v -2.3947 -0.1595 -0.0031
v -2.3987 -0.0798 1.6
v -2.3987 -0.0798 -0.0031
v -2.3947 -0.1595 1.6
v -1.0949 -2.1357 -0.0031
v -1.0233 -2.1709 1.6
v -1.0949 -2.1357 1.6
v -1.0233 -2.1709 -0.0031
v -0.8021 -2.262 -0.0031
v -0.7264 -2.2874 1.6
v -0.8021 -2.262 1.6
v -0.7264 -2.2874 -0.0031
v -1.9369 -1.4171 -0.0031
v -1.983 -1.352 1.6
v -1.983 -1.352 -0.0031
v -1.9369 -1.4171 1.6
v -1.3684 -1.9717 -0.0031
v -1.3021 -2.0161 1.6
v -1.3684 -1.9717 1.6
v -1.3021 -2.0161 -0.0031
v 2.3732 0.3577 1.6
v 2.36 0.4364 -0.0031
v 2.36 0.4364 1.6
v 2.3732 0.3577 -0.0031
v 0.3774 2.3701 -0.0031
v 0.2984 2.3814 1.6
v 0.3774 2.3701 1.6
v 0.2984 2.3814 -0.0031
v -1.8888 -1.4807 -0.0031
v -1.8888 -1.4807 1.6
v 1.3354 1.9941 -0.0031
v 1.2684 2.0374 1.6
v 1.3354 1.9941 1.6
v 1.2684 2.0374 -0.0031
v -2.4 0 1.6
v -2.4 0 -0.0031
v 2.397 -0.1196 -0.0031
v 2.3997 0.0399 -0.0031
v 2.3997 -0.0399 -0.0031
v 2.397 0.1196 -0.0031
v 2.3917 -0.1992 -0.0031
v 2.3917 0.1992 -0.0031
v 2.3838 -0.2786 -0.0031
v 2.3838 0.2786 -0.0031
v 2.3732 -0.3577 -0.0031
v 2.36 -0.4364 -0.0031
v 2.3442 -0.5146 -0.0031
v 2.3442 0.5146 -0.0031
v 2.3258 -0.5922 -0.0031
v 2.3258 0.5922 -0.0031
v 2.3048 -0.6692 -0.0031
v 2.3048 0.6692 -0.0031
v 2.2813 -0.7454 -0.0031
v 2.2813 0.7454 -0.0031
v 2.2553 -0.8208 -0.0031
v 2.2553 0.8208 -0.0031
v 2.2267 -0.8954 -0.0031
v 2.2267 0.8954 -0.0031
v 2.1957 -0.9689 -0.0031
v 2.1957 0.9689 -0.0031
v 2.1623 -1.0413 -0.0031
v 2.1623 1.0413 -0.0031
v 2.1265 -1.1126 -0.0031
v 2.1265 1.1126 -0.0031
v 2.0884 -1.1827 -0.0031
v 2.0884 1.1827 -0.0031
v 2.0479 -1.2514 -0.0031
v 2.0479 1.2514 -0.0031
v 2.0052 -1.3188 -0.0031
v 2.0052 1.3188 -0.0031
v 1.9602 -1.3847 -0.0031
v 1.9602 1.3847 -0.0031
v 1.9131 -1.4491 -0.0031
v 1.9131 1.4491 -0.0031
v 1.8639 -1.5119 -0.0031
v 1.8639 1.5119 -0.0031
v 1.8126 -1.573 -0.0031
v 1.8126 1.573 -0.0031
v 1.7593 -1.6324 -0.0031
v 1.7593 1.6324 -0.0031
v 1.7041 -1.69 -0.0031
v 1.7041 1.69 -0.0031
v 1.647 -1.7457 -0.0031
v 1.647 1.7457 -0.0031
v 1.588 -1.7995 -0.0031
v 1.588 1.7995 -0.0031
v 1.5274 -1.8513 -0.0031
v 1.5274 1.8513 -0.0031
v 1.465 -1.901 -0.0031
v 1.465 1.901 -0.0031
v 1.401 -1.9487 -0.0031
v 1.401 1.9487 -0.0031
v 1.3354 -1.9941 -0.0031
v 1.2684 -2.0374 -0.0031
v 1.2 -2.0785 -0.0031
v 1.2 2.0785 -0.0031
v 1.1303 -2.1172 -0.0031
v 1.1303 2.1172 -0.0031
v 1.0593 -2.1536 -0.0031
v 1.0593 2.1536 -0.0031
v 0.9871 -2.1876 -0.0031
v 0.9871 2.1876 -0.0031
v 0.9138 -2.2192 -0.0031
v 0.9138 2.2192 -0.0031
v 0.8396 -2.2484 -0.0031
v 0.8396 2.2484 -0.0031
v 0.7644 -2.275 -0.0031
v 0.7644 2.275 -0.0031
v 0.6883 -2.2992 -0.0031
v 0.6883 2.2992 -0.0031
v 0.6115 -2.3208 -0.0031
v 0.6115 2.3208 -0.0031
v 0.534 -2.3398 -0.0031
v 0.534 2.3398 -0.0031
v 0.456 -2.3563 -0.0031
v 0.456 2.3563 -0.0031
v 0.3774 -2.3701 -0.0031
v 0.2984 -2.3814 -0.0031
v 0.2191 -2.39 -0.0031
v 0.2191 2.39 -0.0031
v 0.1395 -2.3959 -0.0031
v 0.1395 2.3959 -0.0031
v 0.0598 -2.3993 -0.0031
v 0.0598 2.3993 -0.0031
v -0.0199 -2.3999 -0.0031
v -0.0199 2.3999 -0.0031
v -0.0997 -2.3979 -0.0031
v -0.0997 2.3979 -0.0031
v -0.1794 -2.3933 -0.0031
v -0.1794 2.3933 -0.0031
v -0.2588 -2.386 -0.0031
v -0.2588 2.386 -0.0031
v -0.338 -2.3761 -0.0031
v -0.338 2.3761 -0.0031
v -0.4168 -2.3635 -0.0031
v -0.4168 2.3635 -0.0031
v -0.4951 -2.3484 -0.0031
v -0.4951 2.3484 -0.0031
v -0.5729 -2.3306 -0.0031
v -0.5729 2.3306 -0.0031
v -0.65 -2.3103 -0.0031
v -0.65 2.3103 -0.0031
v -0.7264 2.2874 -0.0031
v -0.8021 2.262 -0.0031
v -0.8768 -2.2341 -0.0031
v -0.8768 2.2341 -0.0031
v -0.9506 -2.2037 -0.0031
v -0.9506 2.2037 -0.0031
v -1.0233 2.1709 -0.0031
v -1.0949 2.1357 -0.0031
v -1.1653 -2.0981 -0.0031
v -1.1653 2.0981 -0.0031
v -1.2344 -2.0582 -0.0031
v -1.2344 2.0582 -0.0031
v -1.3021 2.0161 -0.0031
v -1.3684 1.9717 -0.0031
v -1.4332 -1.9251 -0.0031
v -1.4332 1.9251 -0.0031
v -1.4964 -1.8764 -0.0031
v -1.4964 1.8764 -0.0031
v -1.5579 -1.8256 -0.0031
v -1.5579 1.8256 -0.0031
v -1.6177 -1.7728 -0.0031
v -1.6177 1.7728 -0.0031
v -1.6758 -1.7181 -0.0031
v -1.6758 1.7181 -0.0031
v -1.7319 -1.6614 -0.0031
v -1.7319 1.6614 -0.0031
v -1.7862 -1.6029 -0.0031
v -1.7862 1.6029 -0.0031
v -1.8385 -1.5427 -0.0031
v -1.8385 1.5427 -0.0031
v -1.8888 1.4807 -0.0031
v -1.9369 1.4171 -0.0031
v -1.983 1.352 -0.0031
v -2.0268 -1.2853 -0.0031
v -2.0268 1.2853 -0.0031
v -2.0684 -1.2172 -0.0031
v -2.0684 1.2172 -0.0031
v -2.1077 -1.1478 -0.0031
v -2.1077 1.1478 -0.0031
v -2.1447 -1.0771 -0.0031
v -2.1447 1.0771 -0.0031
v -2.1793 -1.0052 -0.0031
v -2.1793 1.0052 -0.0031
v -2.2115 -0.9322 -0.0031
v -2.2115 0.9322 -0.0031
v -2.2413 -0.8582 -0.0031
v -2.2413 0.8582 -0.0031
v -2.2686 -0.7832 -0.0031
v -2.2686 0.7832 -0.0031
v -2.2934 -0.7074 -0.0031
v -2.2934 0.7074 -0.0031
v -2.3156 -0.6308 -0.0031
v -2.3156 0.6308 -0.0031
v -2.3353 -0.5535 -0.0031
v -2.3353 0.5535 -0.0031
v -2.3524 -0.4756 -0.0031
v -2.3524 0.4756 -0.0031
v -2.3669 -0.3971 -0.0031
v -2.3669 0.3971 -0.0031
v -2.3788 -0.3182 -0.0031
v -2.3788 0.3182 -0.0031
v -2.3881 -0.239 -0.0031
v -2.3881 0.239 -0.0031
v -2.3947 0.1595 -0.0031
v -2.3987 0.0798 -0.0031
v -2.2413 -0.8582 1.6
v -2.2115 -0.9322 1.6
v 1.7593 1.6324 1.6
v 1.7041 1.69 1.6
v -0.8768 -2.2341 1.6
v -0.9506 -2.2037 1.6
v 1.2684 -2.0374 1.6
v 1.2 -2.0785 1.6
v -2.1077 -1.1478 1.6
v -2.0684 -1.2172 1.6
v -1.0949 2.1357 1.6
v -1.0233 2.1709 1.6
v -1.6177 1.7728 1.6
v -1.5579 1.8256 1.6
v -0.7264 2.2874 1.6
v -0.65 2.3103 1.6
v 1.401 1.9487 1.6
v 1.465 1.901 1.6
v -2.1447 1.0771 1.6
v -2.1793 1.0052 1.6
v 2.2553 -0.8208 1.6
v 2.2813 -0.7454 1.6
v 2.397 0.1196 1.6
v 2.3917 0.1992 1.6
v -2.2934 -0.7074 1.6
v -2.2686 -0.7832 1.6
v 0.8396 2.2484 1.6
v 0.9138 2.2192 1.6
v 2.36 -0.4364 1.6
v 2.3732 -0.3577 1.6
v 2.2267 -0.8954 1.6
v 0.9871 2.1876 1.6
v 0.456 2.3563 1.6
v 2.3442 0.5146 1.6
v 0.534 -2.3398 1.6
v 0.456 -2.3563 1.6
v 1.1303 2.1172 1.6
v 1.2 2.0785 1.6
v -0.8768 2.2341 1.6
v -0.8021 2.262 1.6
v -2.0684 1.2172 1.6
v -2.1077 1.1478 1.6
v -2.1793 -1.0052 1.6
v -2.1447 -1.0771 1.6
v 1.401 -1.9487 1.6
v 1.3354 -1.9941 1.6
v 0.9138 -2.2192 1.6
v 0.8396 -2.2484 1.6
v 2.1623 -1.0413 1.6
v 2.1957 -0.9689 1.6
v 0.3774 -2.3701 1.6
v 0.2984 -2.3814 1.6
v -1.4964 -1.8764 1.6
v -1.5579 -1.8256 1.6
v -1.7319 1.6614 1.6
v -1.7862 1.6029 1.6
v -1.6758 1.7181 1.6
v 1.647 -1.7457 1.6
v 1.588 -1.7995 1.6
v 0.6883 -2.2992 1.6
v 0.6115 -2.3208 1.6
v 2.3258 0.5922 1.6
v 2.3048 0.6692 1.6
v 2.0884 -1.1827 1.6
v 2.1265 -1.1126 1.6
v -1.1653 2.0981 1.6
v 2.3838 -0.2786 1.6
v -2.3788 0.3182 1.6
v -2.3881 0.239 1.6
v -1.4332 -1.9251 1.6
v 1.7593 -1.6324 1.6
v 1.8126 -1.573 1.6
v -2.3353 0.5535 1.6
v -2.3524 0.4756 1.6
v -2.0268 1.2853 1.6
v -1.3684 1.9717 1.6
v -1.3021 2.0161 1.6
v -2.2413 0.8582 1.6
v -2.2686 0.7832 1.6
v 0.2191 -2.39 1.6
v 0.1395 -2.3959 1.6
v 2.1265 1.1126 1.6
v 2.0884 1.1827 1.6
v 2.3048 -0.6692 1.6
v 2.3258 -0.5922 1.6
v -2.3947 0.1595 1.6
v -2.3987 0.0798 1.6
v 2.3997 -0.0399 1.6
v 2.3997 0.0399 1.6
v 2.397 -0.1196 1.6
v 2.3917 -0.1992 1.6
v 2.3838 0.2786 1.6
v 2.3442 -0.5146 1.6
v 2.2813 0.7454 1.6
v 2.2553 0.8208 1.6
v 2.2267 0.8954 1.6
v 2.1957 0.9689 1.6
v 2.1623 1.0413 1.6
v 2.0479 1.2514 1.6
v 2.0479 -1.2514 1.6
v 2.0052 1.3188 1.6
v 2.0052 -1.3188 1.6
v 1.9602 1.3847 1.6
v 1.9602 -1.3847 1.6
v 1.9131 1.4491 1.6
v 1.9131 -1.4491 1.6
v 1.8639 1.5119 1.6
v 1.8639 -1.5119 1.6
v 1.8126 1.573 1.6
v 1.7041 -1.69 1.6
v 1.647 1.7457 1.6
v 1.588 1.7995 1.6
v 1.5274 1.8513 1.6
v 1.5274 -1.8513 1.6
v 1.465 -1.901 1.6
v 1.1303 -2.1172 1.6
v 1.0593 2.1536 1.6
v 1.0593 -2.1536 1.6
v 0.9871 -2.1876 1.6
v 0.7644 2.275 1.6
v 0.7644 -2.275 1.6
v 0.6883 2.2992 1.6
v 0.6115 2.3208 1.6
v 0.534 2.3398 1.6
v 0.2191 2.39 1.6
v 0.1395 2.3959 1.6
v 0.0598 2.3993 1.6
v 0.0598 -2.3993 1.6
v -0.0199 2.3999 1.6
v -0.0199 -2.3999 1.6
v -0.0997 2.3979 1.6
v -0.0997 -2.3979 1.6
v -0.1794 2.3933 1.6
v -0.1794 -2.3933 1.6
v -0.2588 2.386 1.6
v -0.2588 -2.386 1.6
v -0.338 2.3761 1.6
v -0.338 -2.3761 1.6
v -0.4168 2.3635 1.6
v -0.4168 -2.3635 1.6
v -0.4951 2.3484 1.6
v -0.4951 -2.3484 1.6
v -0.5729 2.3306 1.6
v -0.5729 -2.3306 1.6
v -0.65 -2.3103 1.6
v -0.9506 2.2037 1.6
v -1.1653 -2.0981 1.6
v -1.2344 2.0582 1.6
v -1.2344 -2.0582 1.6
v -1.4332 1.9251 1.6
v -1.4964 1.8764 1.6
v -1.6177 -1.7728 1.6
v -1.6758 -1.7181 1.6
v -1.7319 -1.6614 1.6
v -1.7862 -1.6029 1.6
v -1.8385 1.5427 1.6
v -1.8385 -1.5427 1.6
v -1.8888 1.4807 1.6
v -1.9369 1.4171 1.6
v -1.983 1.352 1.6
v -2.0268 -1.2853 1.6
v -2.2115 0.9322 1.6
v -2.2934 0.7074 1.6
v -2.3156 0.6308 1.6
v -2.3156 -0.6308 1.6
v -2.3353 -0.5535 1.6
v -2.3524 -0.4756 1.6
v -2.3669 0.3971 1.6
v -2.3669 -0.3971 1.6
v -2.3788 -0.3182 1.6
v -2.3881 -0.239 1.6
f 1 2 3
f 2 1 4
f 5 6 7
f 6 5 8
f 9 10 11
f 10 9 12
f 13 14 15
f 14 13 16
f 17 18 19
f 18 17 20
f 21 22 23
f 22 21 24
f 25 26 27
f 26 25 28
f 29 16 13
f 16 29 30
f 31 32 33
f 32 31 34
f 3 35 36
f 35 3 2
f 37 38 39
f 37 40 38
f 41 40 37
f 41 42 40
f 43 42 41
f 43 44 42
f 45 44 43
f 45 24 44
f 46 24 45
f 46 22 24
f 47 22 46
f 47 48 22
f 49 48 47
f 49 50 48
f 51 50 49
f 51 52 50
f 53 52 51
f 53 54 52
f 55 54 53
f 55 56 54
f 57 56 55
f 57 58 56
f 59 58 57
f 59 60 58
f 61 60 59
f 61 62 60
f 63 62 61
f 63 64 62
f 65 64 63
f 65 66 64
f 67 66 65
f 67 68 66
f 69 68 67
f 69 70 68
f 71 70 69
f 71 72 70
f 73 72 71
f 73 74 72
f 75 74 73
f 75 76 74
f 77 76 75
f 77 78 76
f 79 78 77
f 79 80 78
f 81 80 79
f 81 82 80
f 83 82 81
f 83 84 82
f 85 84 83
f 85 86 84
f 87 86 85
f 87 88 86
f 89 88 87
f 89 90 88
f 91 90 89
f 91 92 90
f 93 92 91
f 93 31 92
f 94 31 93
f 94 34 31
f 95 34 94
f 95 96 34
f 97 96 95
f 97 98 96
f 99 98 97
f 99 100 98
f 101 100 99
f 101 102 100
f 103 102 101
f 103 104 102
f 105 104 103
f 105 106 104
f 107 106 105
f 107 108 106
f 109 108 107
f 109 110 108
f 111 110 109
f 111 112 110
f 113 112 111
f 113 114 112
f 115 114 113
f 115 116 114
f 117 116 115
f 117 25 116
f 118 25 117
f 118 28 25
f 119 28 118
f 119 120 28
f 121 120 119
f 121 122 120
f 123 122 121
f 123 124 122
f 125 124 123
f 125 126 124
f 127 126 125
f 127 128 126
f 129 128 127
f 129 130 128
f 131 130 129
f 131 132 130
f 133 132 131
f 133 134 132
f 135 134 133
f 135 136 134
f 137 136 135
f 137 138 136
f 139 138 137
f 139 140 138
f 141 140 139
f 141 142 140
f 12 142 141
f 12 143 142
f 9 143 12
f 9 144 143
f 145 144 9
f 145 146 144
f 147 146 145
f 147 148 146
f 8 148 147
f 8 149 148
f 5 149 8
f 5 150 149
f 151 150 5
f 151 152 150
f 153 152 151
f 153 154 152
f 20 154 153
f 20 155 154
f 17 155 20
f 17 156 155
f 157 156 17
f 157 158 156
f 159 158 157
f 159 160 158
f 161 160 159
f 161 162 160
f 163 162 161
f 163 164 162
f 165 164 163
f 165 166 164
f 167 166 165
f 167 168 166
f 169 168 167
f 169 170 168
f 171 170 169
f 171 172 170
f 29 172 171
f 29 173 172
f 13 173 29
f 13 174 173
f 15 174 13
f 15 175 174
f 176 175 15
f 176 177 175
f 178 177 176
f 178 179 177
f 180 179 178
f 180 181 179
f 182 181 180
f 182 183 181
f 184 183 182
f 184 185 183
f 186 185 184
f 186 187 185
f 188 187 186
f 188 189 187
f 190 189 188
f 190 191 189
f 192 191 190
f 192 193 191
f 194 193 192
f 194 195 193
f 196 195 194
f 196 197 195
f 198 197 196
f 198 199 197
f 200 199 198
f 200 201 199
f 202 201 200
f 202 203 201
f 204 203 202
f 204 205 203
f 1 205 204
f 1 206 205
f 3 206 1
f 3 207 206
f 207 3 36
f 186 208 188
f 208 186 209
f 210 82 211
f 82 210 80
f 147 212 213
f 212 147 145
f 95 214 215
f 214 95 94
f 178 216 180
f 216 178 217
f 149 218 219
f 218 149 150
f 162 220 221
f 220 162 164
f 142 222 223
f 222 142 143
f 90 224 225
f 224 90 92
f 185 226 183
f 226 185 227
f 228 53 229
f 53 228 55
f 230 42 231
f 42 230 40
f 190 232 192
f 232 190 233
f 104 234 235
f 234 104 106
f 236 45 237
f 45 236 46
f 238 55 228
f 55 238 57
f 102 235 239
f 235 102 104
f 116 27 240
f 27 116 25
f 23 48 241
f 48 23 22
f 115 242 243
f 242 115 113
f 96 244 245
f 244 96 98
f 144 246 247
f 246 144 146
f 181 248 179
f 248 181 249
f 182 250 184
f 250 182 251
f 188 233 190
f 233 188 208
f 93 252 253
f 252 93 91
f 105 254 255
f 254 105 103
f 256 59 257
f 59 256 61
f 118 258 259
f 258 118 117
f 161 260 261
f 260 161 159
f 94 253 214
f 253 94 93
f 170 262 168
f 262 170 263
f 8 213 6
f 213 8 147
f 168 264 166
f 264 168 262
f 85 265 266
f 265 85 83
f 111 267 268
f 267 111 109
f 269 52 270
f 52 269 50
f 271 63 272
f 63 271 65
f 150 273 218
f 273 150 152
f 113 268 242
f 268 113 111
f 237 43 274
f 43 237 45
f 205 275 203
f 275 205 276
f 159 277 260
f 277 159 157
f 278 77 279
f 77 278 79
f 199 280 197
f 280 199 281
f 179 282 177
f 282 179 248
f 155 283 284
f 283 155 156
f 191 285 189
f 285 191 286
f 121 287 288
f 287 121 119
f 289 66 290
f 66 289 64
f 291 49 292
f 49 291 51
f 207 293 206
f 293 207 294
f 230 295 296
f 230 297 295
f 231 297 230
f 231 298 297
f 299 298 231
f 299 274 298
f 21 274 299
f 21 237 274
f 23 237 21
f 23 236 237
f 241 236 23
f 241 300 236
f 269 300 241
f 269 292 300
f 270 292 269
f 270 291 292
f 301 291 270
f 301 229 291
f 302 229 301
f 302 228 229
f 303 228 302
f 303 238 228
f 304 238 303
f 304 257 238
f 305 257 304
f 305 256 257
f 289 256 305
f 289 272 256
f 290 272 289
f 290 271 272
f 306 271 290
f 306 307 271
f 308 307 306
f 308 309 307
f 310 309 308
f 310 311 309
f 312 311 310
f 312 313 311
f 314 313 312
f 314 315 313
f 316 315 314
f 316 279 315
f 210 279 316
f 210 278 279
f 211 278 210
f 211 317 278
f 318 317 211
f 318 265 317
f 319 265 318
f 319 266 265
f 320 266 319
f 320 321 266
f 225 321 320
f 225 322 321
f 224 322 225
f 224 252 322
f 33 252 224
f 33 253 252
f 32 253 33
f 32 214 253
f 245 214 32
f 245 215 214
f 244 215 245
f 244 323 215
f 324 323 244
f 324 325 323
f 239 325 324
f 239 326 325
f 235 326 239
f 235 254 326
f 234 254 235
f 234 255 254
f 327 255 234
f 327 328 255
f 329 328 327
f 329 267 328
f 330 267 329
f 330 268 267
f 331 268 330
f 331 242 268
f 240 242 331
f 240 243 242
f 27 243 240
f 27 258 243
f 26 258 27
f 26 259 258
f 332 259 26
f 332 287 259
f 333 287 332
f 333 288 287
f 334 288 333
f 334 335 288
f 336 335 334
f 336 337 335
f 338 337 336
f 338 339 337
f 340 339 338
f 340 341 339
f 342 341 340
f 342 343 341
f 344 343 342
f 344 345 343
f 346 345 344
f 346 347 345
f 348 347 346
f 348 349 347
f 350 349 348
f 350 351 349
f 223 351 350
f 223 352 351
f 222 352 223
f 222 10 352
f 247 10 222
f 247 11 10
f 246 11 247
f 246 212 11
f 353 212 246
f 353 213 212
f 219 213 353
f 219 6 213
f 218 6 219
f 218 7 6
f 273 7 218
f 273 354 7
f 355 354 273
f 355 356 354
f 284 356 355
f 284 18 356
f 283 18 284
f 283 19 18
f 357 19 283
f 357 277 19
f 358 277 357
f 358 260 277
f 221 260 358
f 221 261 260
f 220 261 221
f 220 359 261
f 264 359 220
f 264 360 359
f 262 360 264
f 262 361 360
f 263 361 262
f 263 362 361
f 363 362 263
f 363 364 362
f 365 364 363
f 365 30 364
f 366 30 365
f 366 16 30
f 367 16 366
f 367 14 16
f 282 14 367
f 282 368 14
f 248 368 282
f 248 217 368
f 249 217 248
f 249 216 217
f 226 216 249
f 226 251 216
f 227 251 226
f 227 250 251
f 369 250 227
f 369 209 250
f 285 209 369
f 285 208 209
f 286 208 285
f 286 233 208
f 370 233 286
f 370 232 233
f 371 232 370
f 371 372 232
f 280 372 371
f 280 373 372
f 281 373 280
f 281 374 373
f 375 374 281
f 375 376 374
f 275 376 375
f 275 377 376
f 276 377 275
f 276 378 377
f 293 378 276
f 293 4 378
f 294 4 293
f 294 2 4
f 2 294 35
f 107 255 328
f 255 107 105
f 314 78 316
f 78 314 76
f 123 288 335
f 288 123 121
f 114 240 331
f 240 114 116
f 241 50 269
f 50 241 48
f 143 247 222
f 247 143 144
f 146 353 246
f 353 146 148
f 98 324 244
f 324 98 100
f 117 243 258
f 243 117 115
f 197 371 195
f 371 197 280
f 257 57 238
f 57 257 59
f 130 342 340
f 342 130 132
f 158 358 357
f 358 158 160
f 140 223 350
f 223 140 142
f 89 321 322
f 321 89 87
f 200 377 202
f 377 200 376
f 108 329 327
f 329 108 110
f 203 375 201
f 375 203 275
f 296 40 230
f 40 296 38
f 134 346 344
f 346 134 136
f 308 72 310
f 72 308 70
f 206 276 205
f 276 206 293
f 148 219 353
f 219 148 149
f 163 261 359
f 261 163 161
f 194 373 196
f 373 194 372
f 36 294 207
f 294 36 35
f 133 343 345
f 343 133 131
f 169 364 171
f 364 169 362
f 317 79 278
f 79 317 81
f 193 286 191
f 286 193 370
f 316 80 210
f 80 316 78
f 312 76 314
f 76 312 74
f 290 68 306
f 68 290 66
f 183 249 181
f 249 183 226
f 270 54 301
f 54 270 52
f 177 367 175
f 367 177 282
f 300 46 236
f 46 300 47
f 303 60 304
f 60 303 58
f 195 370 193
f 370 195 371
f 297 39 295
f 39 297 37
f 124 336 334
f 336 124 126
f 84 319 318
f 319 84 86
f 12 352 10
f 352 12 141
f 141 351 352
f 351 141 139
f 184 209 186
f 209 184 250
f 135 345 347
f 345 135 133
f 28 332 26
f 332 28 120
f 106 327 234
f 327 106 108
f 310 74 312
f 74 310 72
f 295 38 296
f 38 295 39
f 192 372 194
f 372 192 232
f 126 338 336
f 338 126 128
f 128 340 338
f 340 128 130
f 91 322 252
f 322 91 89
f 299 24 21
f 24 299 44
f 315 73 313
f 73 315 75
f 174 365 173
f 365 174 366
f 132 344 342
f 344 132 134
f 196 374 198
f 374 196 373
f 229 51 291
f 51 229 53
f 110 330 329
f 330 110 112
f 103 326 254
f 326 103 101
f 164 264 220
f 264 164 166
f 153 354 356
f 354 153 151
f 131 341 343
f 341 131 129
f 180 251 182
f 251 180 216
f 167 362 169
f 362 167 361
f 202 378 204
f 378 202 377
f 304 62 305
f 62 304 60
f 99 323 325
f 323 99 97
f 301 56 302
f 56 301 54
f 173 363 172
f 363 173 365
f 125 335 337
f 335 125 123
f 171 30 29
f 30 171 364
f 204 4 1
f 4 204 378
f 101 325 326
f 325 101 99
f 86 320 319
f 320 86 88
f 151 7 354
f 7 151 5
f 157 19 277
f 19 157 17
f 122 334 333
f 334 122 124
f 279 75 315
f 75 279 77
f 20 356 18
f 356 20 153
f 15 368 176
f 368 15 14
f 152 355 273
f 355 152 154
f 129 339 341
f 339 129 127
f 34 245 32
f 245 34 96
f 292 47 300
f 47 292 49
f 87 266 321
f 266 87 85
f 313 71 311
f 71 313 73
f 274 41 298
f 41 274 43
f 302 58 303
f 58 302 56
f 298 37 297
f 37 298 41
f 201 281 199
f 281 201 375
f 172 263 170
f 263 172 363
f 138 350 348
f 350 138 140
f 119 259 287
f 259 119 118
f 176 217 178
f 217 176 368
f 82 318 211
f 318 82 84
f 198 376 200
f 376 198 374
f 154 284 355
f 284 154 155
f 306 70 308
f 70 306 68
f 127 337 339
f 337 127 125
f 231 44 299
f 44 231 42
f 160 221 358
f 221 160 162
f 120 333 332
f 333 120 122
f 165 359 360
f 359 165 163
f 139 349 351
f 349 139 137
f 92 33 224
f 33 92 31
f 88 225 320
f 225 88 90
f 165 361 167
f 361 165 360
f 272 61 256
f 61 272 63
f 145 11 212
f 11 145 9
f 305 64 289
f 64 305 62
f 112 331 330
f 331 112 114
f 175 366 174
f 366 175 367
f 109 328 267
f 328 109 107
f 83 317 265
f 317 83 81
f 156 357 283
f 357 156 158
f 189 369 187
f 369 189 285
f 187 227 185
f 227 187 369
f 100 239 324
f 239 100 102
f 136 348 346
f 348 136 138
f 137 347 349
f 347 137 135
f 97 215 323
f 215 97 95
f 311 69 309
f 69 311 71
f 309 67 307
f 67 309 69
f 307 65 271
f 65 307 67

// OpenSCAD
// file: ../p/stud3.scad
use <../lib.scad>
use <4-4cyli.scad>
use <4-4disc.scad>
use <4-4edge.scad>
$fa=1; $fs=0.2;
function ldraw_lib__stud3(realsolid=false) = realsolid ? 
    [openscad(translate([0,0,-eps()], o=cylinder(4+eps(), r=4)),2)] : [
// 0 Stud Tube Solid
// 0 Name: stud3.dat
// 0 Author: James Jessiman
// 0 !LDRAW_ORG Primitive UPDATE 2012-01
// 0 !LICENSE Licensed under CC BY 2.0 and CC BY 4.0 : see CAreadme.txt
// 
// 0 BFC CERTIFY CCW
  [0,"BFC","CERTIFY"],
  [0,"BFC","CCW"],
// 
// 0 !HISTORY 2002-04-04 [sbliss] Modified for BFC compliance
// 0 !HISTORY 2002-04-25 [PTadmin] Official Update 2002-02
// 0 !HISTORY 2007-06-24 [PTadmin] Header formatted for Contributor Agreement
// 0 !HISTORY 2008-07-01 [PTadmin] Official Update 2008-01
// 0 !HISTORY 2012-02-16 [Philo] Changed to CCW
// 0 !HISTORY 2012-03-30 [PTadmin] Official Update 2012-01
// 
// 
// 1 16 0 -4 0 4 0 0 0 1 0 0 0 4 4-4edge.dat
  [1,16,0,-4,0,4,0,0,0,1,0,0,0,4, ldraw_lib__4_4edge(realsolid)],
// 1 16 0 0 0 4 0 0 0 1 0 0 0 4 4-4edge.dat
  [1,16,0,0,0,4,0,0,0,1,0,0,0,4, ldraw_lib__4_4edge(realsolid)],
// 1 16 0 -4 0 4 0 0 0 1 0 0 0 4 4-4disc.dat
  [1,16,0,-4,0,4,0,0,0,1,0,0,0,4, ldraw_lib__4_4disc(realsolid)],
// 1 16 0 -4 0 4 0 0 0 4 0 0 0 4 4-4cyli.dat
  [1,16,0,-4,0,4,0,0,0,4,0,0,0,4, ldraw_lib__4_4cyli(realsolid)],
];
module ldraw_lib__stud3(step=0, col=false, unit=2/5, alt=false, line=0.2, solid=!$preview)
    makepoly(ldraw_lib__stud3(solid), step=step, col=col, unit=unit, alt=alt, line=line, solid=solid);
ldraw_lib__stud3(line=0.2);
// file: ../p/4-4edge.scad
use <../lib.scad>
$fa=1; $fs=0.2;
function ldraw_lib__4_4edge(realsolid=false) = [
// 0 Circle 1.0
// 0 Name: 4-4edge.dat
// 0 Author: James Jessiman
// 0 !LDRAW_ORG Primitive UPDATE 2017-01
// 0 !LICENSE Licensed under CC BY 2.0 and CC BY 4.0 : see CAreadme.txt
// 
// 0 BFC CERTIFY CCW
  [0,"BFC","CERTIFY"],
  [0,"BFC","CCW"],
// 
// 0 !HISTORY 1998-12-15 [PTadmin] Official Update 1998-10
// 0 !HISTORY 2005-12-28 [PTadmin] Official Update 2005-01
// 0 !HISTORY 2007-06-24 [PTadmin] Header formatted for Contributor Agreement
// 0 !HISTORY 2008-07-01 [PTadmin] Official Update 2008-01
// 0 !HISTORY 2017-01-15 [Steffen] BFCed
// 0 !HISTORY 2017-12-30 [PTadmin] Official Update 2017-01
// 
// 
// 2 24 1 0 0 0.9239 0 0.3827
  [2,24,1,0,0,0.9239,0,0.3827],
// 2 24 0.9239 0 0.3827 0.7071 0 0.7071
  [2,24,0.9239,0,0.3827,0.7071,0,0.7071],
// 2 24 0.7071 0 0.7071 0.3827 0 0.9239
  [2,24,0.7071,0,0.7071,0.3827,0,0.9239],
// 2 24 0.3827 0 0.9239 0 0 1
  [2,24,0.3827,0,0.9239,0,0,1],
// 2 24 0 0 1 -0.3827 0 0.9239
  [2,24,0,0,1,-0.3827,0,0.9239],
// 2 24 -0.3827 0 0.9239 -0.7071 0 0.7071
  [2,24,-0.3827,0,0.9239,-0.7071,0,0.7071],
// 2 24 -0.7071 0 0.7071 -0.9239 0 0.3827
  [2,24,-0.7071,0,0.7071,-0.9239,0,0.3827],
// 2 24 -0.9239 0 0.3827 -1 0 -0
  [2,24,-0.9239,0,0.3827,-1,0,-0],
// 2 24 -1 0 -0 -0.9239 0 -0.3827
  [2,24,-1,0,-0,-0.9239,0,-0.3827],
// 2 24 -0.9239 0 -0.3827 -0.7071 0 -0.7071
  [2,24,-0.9239,0,-0.3827,-0.7071,0,-0.7071],
// 2 24 -0.7071 0 -0.7071 -0.3827 0 -0.9239
  [2,24,-0.7071,0,-0.7071,-0.3827,0,-0.9239],
// 2 24 -0.3827 0 -0.9239 0 0 -1
  [2,24,-0.3827,0,-0.9239,0,0,-1],
// 2 24 0 0 -1 0.3827 0 -0.9239
  [2,24,0,0,-1,0.3827,0,-0.9239],
// 2 24 0.3827 0 -0.9239 0.7071 0 -0.7071
  [2,24,0.3827,0,-0.9239,0.7071,0,-0.7071],
// 2 24 0.7071 0 -0.7071 0.9239 0 -0.3827
  [2,24,0.7071,0,-0.7071,0.9239,0,-0.3827],
// 2 24 0.9239 0 -0.3827 1 0 0
  [2,24,0.9239,0,-0.3827,1,0,0],
];
module ldraw_lib__4_4edge(step=0, col=false, unit=2/5, alt=false, line=0.2, solid=!$preview)
    makepoly(ldraw_lib__4_4edge(solid), step=step, col=col, unit=unit, alt=alt, line=line, solid=solid);
ldraw_lib__4_4edge(line=0.2);
// file: ../p/4-4disc.scad
use <../lib.scad>
$fa=1; $fs=0.2;
function ldraw_lib__4_4disc(realsolid=false) = [
// 0 Disc 1.0
// 0 Name: 4-4disc.dat
// 0 Author: James Jessiman
// 0 !LDRAW_ORG Primitive UPDATE 2002-02
// 0 !LICENSE Licensed under CC BY 2.0 and CC BY 4.0 : see CAreadme.txt
// 
// 0 BFC CERTIFY CCW
  [0,"BFC","CERTIFY"],
  [0,"BFC","CCW"],
// 
// 0 !HISTORY 1998-12-15 [PTadmin] Official Update 1998-10
// 0 !HISTORY 2002-03-23 [sbliss] Added BFC statement
// 0 !HISTORY 2002-04-25 [PTadmin] Official Update 2002-02
// 0 !HISTORY 2007-06-24 [PTadmin] Header formatted for Contributor Agreement
// 0 !HISTORY 2008-07-01 [PTadmin] Official Update 2008-01
// 
// 
// 3 16 0 0 0 1 0 0 0.9239 0 0.3827
  [3,16,0,0,0,1,0,0,0.9239,0,0.3827],
// 3 16 0 0 0 0.9239 0 0.3827 0.7071 0 0.7071
  [3,16,0,0,0,0.9239,0,0.3827,0.7071,0,0.7071],
// 3 16 0 0 0 0.7071 0 0.7071 0.3827 0 0.9239
  [3,16,0,0,0,0.7071,0,0.7071,0.3827,0,0.9239],
// 3 16 0 0 0 0.3827 0 0.9239 0 0 1
  [3,16,0,0,0,0.3827,0,0.9239,0,0,1],
// 3 16 0 0 0 0 0 1 -0.3827 0 0.9239
  [3,16,0,0,0,0,0,1,-0.3827,0,0.9239],
// 3 16 0 0 0 -0.3827 0 0.9239 -0.7071 0 0.7071
  [3,16,0,0,0,-0.3827,0,0.9239,-0.7071,0,0.7071],
// 3 16 0 0 0 -0.7071 0 0.7071 -0.9239 0 0.3827
  [3,16,0,0,0,-0.7071,0,0.7071,-0.9239,0,0.3827],
// 3 16 0 0 0 -0.9239 0 0.3827 -1 0 -0
  [3,16,0,0,0,-0.9239,0,0.3827,-1,0,-0],
// 3 16 0 0 0 -1 0 -0 -0.9239 0 -0.3827
  [3,16,0,0,0,-1,0,-0,-0.9239,0,-0.3827],
// 3 16 0 0 0 -0.9239 0 -0.3827 -0.7071 0 -0.7071
  [3,16,0,0,0,-0.9239,0,-0.3827,-0.7071,0,-0.7071],
// 3 16 0 0 0 -0.7071 0 -0.7071 -0.3827 0 -0.9239
  [3,16,0,0,0,-0.7071,0,-0.7071,-0.3827,0,-0.9239],
// 3 16 0 0 0 -0.3827 0 -0.9239 0 0 -1
  [3,16,0,0,0,-0.3827,0,-0.9239,0,0,-1],
// 3 16 0 0 0 0 0 -1 0.3827 0 -0.9239
  [3,16,0,0,0,0,0,-1,0.3827,0,-0.9239],
// 3 16 0 0 0 0.3827 0 -0.9239 0.7071 0 -0.7071
  [3,16,0,0,0,0.3827,0,-0.9239,0.7071,0,-0.7071],
// 3 16 0 0 0 0.7071 0 -0.7071 0.9239 0 -0.3827
  [3,16,0,0,0,0.7071,0,-0.7071,0.9239,0,-0.3827],
// 3 16 0 0 0 0.9239 0 -0.3827 1 0 0
  [3,16,0,0,0,0.9239,0,-0.3827,1,0,0],
// 0
];
module ldraw_lib__4_4disc(step=0, col=false, unit=2/5, alt=false, line=0.2, solid=!$preview)
    makepoly(ldraw_lib__4_4disc(solid), step=step, col=col, unit=unit, alt=alt, line=line, solid=solid);
ldraw_lib__4_4disc(line=0.2);
// file: ../p/4-4cyli.scad
use <../lib.scad>
$fa=1; $fs=0.2;
function ldraw_lib__4_4cyli(realsolid=false) = [
// 0 Cylinder 1.0
// 0 Name: 4-4cyli.dat
// 0 Author: James Jessiman
// 0 !LDRAW_ORG Primitive UPDATE 2005-01
// 0 !LICENSE Licensed under CC BY 2.0 and CC BY 4.0 : see CAreadme.txt
// 
// 0 BFC CERTIFY CCW
  [0,"BFC","CERTIFY"],
  [0,"BFC","CCW"],
// 
// 0 !HISTORY 1998-12-15 [PTadmin] Official Update 1998-10
// 0 !HISTORY 2002-03-23 [sbliss] Added BFC statement; merged headers from files in distributions LDraw 0.27 and Complete.
// 0 !HISTORY 2002-04-25 [PTadmin] Official Update 2002-02
// 0 !HISTORY 2004-12-14 [guyvivan] BFC CCW
// 0 !HISTORY 2005-12-28 [PTadmin] Official Update 2005-01
// 0 !HISTORY 2007-06-24 [PTadmin] Header formatted for Contributor Agreement
// 0 !HISTORY 2008-07-01 [PTadmin] Official Update 2008-01
// 
// 
// 4 16 1 1 0 0.9239 1 0.3827 0.9239 0 0.3827 1 0 0
  [4,16,1,1,0,0.9239,1,0.3827,0.9239,0,0.3827,1,0,0],
// 5 24 1 0 0 1 1 0 0.9239 0 0.3827 0.9239 0 -0.3827
  [5,24,1,0,0,1,1,0,0.9239,0,0.3827,0.9239,0,-0.3827],
// 4 16 0.9239 1 0.3827 0.7071 1 0.7071 0.7071 0 0.7071 0.9239 0 0.3827
  [4,16,0.9239,1,0.3827,0.7071,1,0.7071,0.7071,0,0.7071,0.9239,0,0.3827],
// 5 24 0.9239 0 0.3827 0.9239 1 0.3827 0.7071 0 0.7071 1 0 0
  [5,24,0.9239,0,0.3827,0.9239,1,0.3827,0.7071,0,0.7071,1,0,0],
// 4 16 0.7071 1 0.7071 0.3827 1 0.9239 0.3827 0 0.9239 0.7071 0 0.7071
  [4,16,0.7071,1,0.7071,0.3827,1,0.9239,0.3827,0,0.9239,0.7071,0,0.7071],
// 5 24 0.7071 0 0.7071 0.7071 1 0.7071 0.3827 0 0.9239 0.9239 0 0.3827
  [5,24,0.7071,0,0.7071,0.7071,1,0.7071,0.3827,0,0.9239,0.9239,0,0.3827],
// 4 16 0.3827 1 0.9239 0 1 1 0 0 1 0.3827 0 0.9239
  [4,16,0.3827,1,0.9239,0,1,1,0,0,1,0.3827,0,0.9239],
// 5 24 0.3827 0 0.9239 0.3827 1 0.9239 0 0 1 0.7071 0 0.7071
  [5,24,0.3827,0,0.9239,0.3827,1,0.9239,0,0,1,0.7071,0,0.7071],
// 4 16 0 1 1 -0.3827 1 0.9239 -0.3827 0 0.9239 0 0 1
  [4,16,0,1,1,-0.3827,1,0.9239,-0.3827,0,0.9239,0,0,1],
// 5 24 0 0 1 0 1 1 -0.3827 0 0.9239 0.3827 0 0.9239
  [5,24,0,0,1,0,1,1,-0.3827,0,0.9239,0.3827,0,0.9239],
// 4 16 -0.3827 1 0.9239 -0.7071 1 0.7071 -0.7071 0 0.7071 -0.3827 0 0.9239
  [4,16,-0.3827,1,0.9239,-0.7071,1,0.7071,-0.7071,0,0.7071,-0.3827,0,0.9239],
// 5 24 -0.3827 0 0.9239 -0.3827 1 0.9239 -0.7071 0 0.7071 0 0 1
  [5,24,-0.3827,0,0.9239,-0.3827,1,0.9239,-0.7071,0,0.7071,0,0,1],
// 4 16 -0.7071 1 0.7071 -0.9239 1 0.3827 -0.9239 0 0.3827 -0.7071 0 0.7071
  [4,16,-0.7071,1,0.7071,-0.9239,1,0.3827,-0.9239,0,0.3827,-0.7071,0,0.7071],
// 5 24 -0.7071 0 0.7071 -0.7071 1 0.7071 -0.9239 0 0.3827 -0.3827 0 0.9239
  [5,24,-0.7071,0,0.7071,-0.7071,1,0.7071,-0.9239,0,0.3827,-0.3827,0,0.9239],
// 4 16 -0.9239 1 0.3827 -1 1 0 -1 0 0 -0.9239 0 0.3827
  [4,16,-0.9239,1,0.3827,-1,1,0,-1,0,0,-0.9239,0,0.3827],
// 5 24 -0.9239 0 0.3827 -0.9239 1 0.3827 -1 0 0 -0.7071 0 0.7071
  [5,24,-0.9239,0,0.3827,-0.9239,1,0.3827,-1,0,0,-0.7071,0,0.7071],
// 4 16 -1 1 0 -0.9239 1 -0.3827 -0.9239 0 -0.3827 -1 0 0
  [4,16,-1,1,0,-0.9239,1,-0.3827,-0.9239,0,-0.3827,-1,0,0],
// 5 24 -1 0 0 -1 1 0 -0.9239 0 -0.3827 -0.9239 0 0.3827
  [5,24,-1,0,0,-1,1,0,-0.9239,0,-0.3827,-0.9239,0,0.3827],
// 4 16 -0.9239 1 -0.3827 -0.7071 1 -0.7071 -0.7071 0 -0.7071 -0.9239 0 -0.3827
  [4,16,-0.9239,1,-0.3827,-0.7071,1,-0.7071,-0.7071,0,-0.7071,-0.9239,0,-0.3827],
// 5 24 -0.9239 0 -0.3827 -0.9239 1 -0.3827 -0.7071 0 -0.7071 -1 0 0
  [5,24,-0.9239,0,-0.3827,-0.9239,1,-0.3827,-0.7071,0,-0.7071,-1,0,0],
// 4 16 -0.7071 1 -0.7071 -0.3827 1 -0.9239 -0.3827 0 -0.9239 -0.7071 0 -0.7071
  [4,16,-0.7071,1,-0.7071,-0.3827,1,-0.9239,-0.3827,0,-0.9239,-0.7071,0,-0.7071],
// 5 24 -0.7071 0 -0.7071 -0.7071 1 -0.7071 -0.3827 0 -0.9239 -0.9239 0 -0.3827
  [5,24,-0.7071,0,-0.7071,-0.7071,1,-0.7071,-0.3827,0,-0.9239,-0.9239,0,-0.3827],
// 4 16 -0.3827 1 -0.9239 0 1 -1 0 0 -1 -0.3827 0 -0.9239
  [4,16,-0.3827,1,-0.9239,0,1,-1,0,0,-1,-0.3827,0,-0.9239],
// 5 24 -0.3827 0 -0.9239 -0.3827 1 -0.9239 0 0 -1 -0.7071 0 -0.7071
  [5,24,-0.3827,0,-0.9239,-0.3827,1,-0.9239,0,0,-1,-0.7071,0,-0.7071],
// 4 16 0 1 -1 0.3827 1 -0.9239 0.3827 0 -0.9239 0 0 -1
  [4,16,0,1,-1,0.3827,1,-0.9239,0.3827,0,-0.9239,0,0,-1],
// 5 24 0 0 -1 0 1 -1 0.3827 0 -0.9239 -0.3827 0 -0.9239
  [5,24,0,0,-1,0,1,-1,0.3827,0,-0.9239,-0.3827,0,-0.9239],
// 4 16 0.3827 1 -0.9239 0.7071 1 -0.7071 0.7071 0 -0.7071 0.3827 0 -0.9239
  [4,16,0.3827,1,-0.9239,0.7071,1,-0.7071,0.7071,0,-0.7071,0.3827,0,-0.9239],
// 5 24 0.3827 0 -0.9239 0.3827 1 -0.9239 0.7071 0 -0.7071 0 0 -1
  [5,24,0.3827,0,-0.9239,0.3827,1,-0.9239,0.7071,0,-0.7071,0,0,-1],
// 4 16 0.7071 1 -0.7071 0.9239 1 -0.3827 0.9239 0 -0.3827 0.7071 0 -0.7071
  [4,16,0.7071,1,-0.7071,0.9239,1,-0.3827,0.9239,0,-0.3827,0.7071,0,-0.7071],
// 5 24 0.7071 0 -0.7071 0.7071 1 -0.7071 0.9239 0 -0.3827 0.3827 0 -0.9239
  [5,24,0.7071,0,-0.7071,0.7071,1,-0.7071,0.9239,0,-0.3827,0.3827,0,-0.9239],
// 4 16 0.9239 1 -0.3827 1 1 0 1 0 0 0.9239 0 -0.3827
  [4,16,0.9239,1,-0.3827,1,1,0,1,0,0,0.9239,0,-0.3827],
// 5 24 0.9239 0 -0.3827 0.9239 1 -0.3827 1 0 0 0.7071 0 -0.7071
  [5,24,0.9239,0,-0.3827,0.9239,1,-0.3827,1,0,0,0.7071,0,-0.7071],
// 0
];
module ldraw_lib__4_4cyli(step=0, col=false, unit=2/5, alt=false, line=0.2, solid=!$preview)
    makepoly(ldraw_lib__4_4cyli(solid), step=step, col=col, unit=unit, alt=alt, line=line, solid=solid);
ldraw_lib__4_4cyli(line=0.2);
// file: s/3004s01.scad
use <../../lib.scad>
use <../../p/box4t.scad>
use <../../p/box5.scad>
use <../../p/stud.scad>
use <../../p/stud3.scad>
$fa=1; $fs=0.2;
function ldraw_lib__s__3004s01(realsolid=false) = [
// 0 ~Brick  1 x  2 without Front Face
// 0 Name: s\3004s01.dat
// 0 Author: James Jessiman
// 0 !LDRAW_ORG Subpart UPDATE 2003-03
// 0 !LICENSE Licensed under CC BY 2.0 and CC BY 4.0 : see CAreadme.txt
// 
// 0 BFC CERTIFY CCW
  [0,"BFC","CERTIFY"],
  [0,"BFC","CCW"],
// 
// 0 !HISTORY 2003-09-07 [jriley] Subfiling, BFC
// 0 !HISTORY 2003-12-19 [PTadmin] Official Update 2003-03
// 0 !HISTORY 2007-08-29 [PTadmin] Header formatted for Contributor Agreement
// 0 !HISTORY 2008-07-01 [PTadmin] Official Update 2008-01
// 
// 
// 1 16 0 4 0 1 0 0 0 -5 0 0 0 1 stud3.dat
  [1,16,0,4,0,1,0,0,0,-5,0,0,0,1, ldraw_lib__stud3(realsolid)],
// 0 BFC INVERTNEXT
  [0,"BFC","INVERTNEXT"],
// 1 16 0 24 0 16 0 0 0 -20 0 0 0 6 box5.dat
  [1,16,0,24,0,16,0,0,0,-20,0,0,0,6, ldraw_lib__box5(realsolid)],
// 4 16 20 24 10 16 24 6 -16 24 6 -20 24 10
  [4,16,20,24,10,16,24,6,-16,24,6,-20,24,10],
// 4 16 -20 24 10 -16 24 6 -16 24 -6 -20 24 -10
  [4,16,-20,24,10,-16,24,6,-16,24,-6,-20,24,-10],
// 4 16 -20 24 -10 -16 24 -6 16 24 -6 20 24 -10
  [4,16,-20,24,-10,-16,24,-6,16,24,-6,20,24,-10],
// 4 16 20 24 -10 16 24 -6 16 24 6 20 24 10
  [4,16,20,24,-10,16,24,-6,16,24,6,20,24,10],
// 1 16 0 24 0 20 0 0 0 -24 0 0 0 10 box4t.dat
  [1,16,0,24,0,20,0,0,0,-24,0,0,0,10, ldraw_lib__box4t(realsolid)],
// 1 16 10 0 0 1 0 0 0 1 0 0 0 1 stud.dat
  [1,16,10,0,0,1,0,0,0,1,0,0,0,1, ldraw_lib__stud(realsolid)],
// 1 16 -10 0 0 1 0 0 0 1 0 0 0 1 stud.dat
  [1,16,-10,0,0,1,0,0,0,1,0,0,0,1, ldraw_lib__stud(realsolid)],
// 0
];
module ldraw_lib__s__3004s01(step=0, col=false, unit=2/5, alt=false, line=0.2, solid=!$preview)
    makepoly(ldraw_lib__s__3004s01(solid), step=step, col=col, unit=unit, alt=alt, line=line, solid=solid);
ldraw_lib__s__3004s01(line=0.2);
// file: ../p/stud.scad
use <../lib.scad>
use <4-4cyli.scad>
use <4-4disc.scad>
use <4-4edge.scad>
$fa=1; $fs=0.2;
function ldraw_lib__stud(realsolid=false) = realsolid ? 
    [openscad(translate([0,0,-eps()], o=cylinder(4+eps(), r=6)),2)] : [
// 0 Stud
// 0 Name: stud.dat
// 0 Author: James Jessiman
// 0 !LDRAW_ORG Primitive UPDATE 2012-01
// 0 !LICENSE Licensed under CC BY 2.0 and CC BY 4.0 : see CAreadme.txt
// 
// 0 BFC CERTIFY CCW
  [0,"BFC","CERTIFY"],
  [0,"BFC","CCW"],
// 
// 0 !HISTORY 2002-04-04 [sbliss] Modified for BFC compliance
// 0 !HISTORY 2002-04-25 [PTadmin] Official Update 2002-02
// 0 !HISTORY 2007-06-24 [PTadmin] Header formatted for Contributor Agreement
// 0 !HISTORY 2008-07-01 [PTadmin] Official Update 2008-01
// 0 !HISTORY 2012-02-16 [Philo] Changed to CCW
// 0 !HISTORY 2012-03-30 [PTadmin] Official Update 2012-01
// 
// 
// 1 16 0 0 0 6 0 0 0 1 0 0 0 6 4-4edge.dat
  [1,16,0,0,0,6,0,0,0,1,0,0,0,6, ldraw_lib__4_4edge(realsolid)],
// 1 16 0 -4 0 6 0 0 0 1 0 0 0 6 4-4edge.dat
  [1,16,0,-4,0,6,0,0,0,1,0,0,0,6, ldraw_lib__4_4edge(realsolid)],
// 1 16 0 0 0 6 0 0 0 -4 0 0 0 6 4-4cyli.dat
  [1,16,0,0,0,6,0,0,0,-4,0,0,0,6, ldraw_lib__4_4cyli(realsolid)],
// 1 16 0 -4 0 6 0 0 0 1 0 0 0 6 4-4disc.dat
  [1,16,0,-4,0,6,0,0,0,1,0,0,0,6, ldraw_lib__4_4disc(realsolid)],
];
module ldraw_lib__stud(step=0, col=false, unit=2/5, alt=false, line=0.2, solid=!$preview)
    makepoly(ldraw_lib__stud(solid), step=step, col=col, unit=unit, alt=alt, line=line, solid=solid);
ldraw_lib__stud(line=0.2);
// file: ../p/box5.scad
use <../lib.scad>
$fa=1; $fs=0.2;
function ldraw_lib__box5(realsolid=false) = [
// 0 Box with 5 Faces and All Edges
// 0 Name: box5.dat
// 0 Author: James Jessiman
// 0 !LDRAW_ORG Primitive UPDATE 2012-01
// 0 !LICENSE Licensed under CC BY 2.0 and CC BY 4.0 : see CAreadme.txt
// 
// 0 BFC CERTIFY CCW
  [0,"BFC","CERTIFY"],
  [0,"BFC","CCW"],
// 
// 0 !HISTORY 2002-04-03 [sbliss] Modified for BFC compliance
// 0 !HISTORY 2002-04-25 [PTadmin] Official Update 2002-02
// 0 !HISTORY 2007-06-24 [PTadmin] Header formatted for Contributor Agreement
// 0 !HISTORY 2008-07-01 [PTadmin] Official Update 2008-01
// 0 !HISTORY 2012-02-16 [Philo] Changed to CCW
// 0 !HISTORY 2012-03-30 [PTadmin] Official Update 2012-01
// 
// 
// 2 24 1 1 1 -1 1 1
  [2,24,1,1,1,-1,1,1],
// 2 24 -1 1 1 -1 1 -1
  [2,24,-1,1,1,-1,1,-1],
// 2 24 -1 1 -1 1 1 -1
  [2,24,-1,1,-1,1,1,-1],
// 2 24 1 1 -1 1 1 1
  [2,24,1,1,-1,1,1,1],
// 2 24 1 0 1 -1 0 1
  [2,24,1,0,1,-1,0,1],
// 2 24 -1 0 1 -1 0 -1
  [2,24,-1,0,1,-1,0,-1],
// 2 24 -1 0 -1 1 0 -1
  [2,24,-1,0,-1,1,0,-1],
// 2 24 1 0 -1 1 0 1
  [2,24,1,0,-1,1,0,1],
// 2 24 1 0 1 1 1 1
  [2,24,1,0,1,1,1,1],
// 2 24 -1 0 1 -1 1 1
  [2,24,-1,0,1,-1,1,1],
// 2 24 1 0 -1 1 1 -1
  [2,24,1,0,-1,1,1,-1],
// 2 24 -1 0 -1 -1 1 -1
  [2,24,-1,0,-1,-1,1,-1],
// 4 16 -1 1 1 1 1 1 1 1 -1 -1 1 -1
  [4,16,-1,1,1,1,1,1,1,1,-1,-1,1,-1],
// 4 16 -1 1 1 -1 0 1 1 0 1 1 1 1
  [4,16,-1,1,1,-1,0,1,1,0,1,1,1,1],
// 4 16 -1 1 -1 -1 0 -1 -1 0 1 -1 1 1
  [4,16,-1,1,-1,-1,0,-1,-1,0,1,-1,1,1],
// 4 16 1 1 -1 1 0 -1 -1 0 -1 -1 1 -1
  [4,16,1,1,-1,1,0,-1,-1,0,-1,-1,1,-1],
// 4 16 1 1 1 1 0 1 1 0 -1 1 1 -1
  [4,16,1,1,1,1,0,1,1,0,-1,1,1,-1],
];
module ldraw_lib__box5(step=0, col=false, unit=2/5, alt=false, line=0.2, solid=!$preview)
    makepoly(ldraw_lib__box5(solid), step=step, col=col, unit=unit, alt=alt, line=line, solid=solid);
ldraw_lib__box5(line=0.2);
// file: ../p/box4t.scad
use <../lib.scad>
$fa=1; $fs=0.2;
function ldraw_lib__box4t(realsolid=false) = [
// 0 Box with 4 Adjacent Faces and All Edges
// 0 Name: box4t.dat
// 0 Author: Tore Eriksson [Tore_Eriksson]
// 0 !LDRAW_ORG Primitive UPDATE 2003-02
// 0 !LICENSE Licensed under CC BY 2.0 and CC BY 4.0 : see CAreadme.txt
// 
// 0 BFC CERTIFY CCW
  [0,"BFC","CERTIFY"],
  [0,"BFC","CCW"],
// 
// 0 !HISTORY 1997-09-29 [PTadmin] Official Update 1997-15
// 0 !HISTORY 2002-08-31 [izanette] Modified with WINDZ for BFC compliance
// 0 !HISTORY 2003-08-01 [PTadmin] Official Update 2003-02
// 0 !HISTORY 2007-06-24 [PTadmin] Header formatted for Contributor Agreement
// 0 !HISTORY 2008-07-01 [PTadmin] Official Update 2008-01
// 
// 
// 2 24 1 1 1 -1 1 1
  [2,24,1,1,1,-1,1,1],
// 2 24 -1 1 1 -1 1 -1
  [2,24,-1,1,1,-1,1,-1],
// 2 24 -1 1 -1 1 1 -1
  [2,24,-1,1,-1,1,1,-1],
// 2 24 1 1 -1 1 1 1
  [2,24,1,1,-1,1,1,1],
// 2 24 1 0 1 -1 0 1
  [2,24,1,0,1,-1,0,1],
// 2 24 -1 0 1 -1 0 -1
  [2,24,-1,0,1,-1,0,-1],
// 2 24 -1 0 -1 1 0 -1
  [2,24,-1,0,-1,1,0,-1],
// 2 24 1 0 -1 1 0 1
  [2,24,1,0,-1,1,0,1],
// 2 24 1 0 1 1 1 1
  [2,24,1,0,1,1,1,1],
// 2 24 -1 0 1 -1 1 1
  [2,24,-1,0,1,-1,1,1],
// 2 24 1 0 -1 1 1 -1
  [2,24,1,0,-1,1,1,-1],
// 2 24 -1 0 -1 -1 1 -1
  [2,24,-1,0,-1,-1,1,-1],
// 4 16 1 1 1 1 1 -1 -1 1 -1 -1 1 1
  [4,16,1,1,1,1,1,-1,-1,1,-1,-1,1,1],
// 4 16 1 1 1 -1 1 1 -1 0 1 1 0 1
  [4,16,1,1,1,-1,1,1,-1,0,1,1,0,1],
// 4 16 -1 1 1 -1 1 -1 -1 0 -1 -1 0 1
  [4,16,-1,1,1,-1,1,-1,-1,0,-1,-1,0,1],
// 0 4 16 -1 1 -1 -1 0 -1 1 0 -1 1 1 -1
// 4 16 1 1 -1 1 1 1 1 0 1 1 0 -1
  [4,16,1,1,-1,1,1,1,1,0,1,1,0,-1],
// 0
];
module ldraw_lib__box4t(step=0, col=false, unit=2/5, alt=false, line=0.2, solid=!$preview)
    makepoly(ldraw_lib__box4t(solid), step=step, col=col, unit=unit, alt=alt, line=line, solid=solid);
ldraw_lib__box4t(line=0.2);
// file: 3004.scad
use <../lib.scad>
use <s/3004s01.scad>
$fa=1; $fs=0.2;
function ldraw_lib__3004(realsolid=false) = [
// 0 Brick  1 x  2
// 0 Name: 3004.dat
// 0 Author: James Jessiman
// 0 !LDRAW_ORG Part UPDATE 2022-05
// 0 !LICENSE Licensed under CC BY 2.0 and CC BY 4.0 : see CAreadme.txt
// 
// 0 BFC CERTIFY CCW
  [0,"BFC","CERTIFY"],
  [0,"BFC","CCW"],
// 
// 0 !HISTORY 2001-10-26 [PTadmin] Official Update 2001-01
// 0 !HISTORY 2002-05-07 {unknown} BFC Certification
// 0 !HISTORY 2002-06-11 [PTadmin] Official Update 2002-03
// 0 !HISTORY 2007-05-07 [PTadmin] Header formatted for Contributor Agreement
// 0 !HISTORY 2008-07-01 [PTadmin] Official Update 2008-01
// 0 !HISTORY 2022-08-04 [MagFors] Using subfile
// 0 !HISTORY 2022-09-15 [PTadmin] Official Update 2022-05
// 
// 
// 1 16 0 0 0 1 0 0 0 1 0 0 0 1 s\3004s01.dat
  [1,16,0,0,0,1,0,0,0,1,0,0,0,1, ldraw_lib__s__3004s01(realsolid)],
// 4 16 -20 24 -10 20 24 -10 20 0 -10 -20 0 -10
  [4,16,-20,24,-10,20,24,-10,20,0,-10,-20,0,-10],
];
module ldraw_lib__3004(step=0, col=false, unit=2/5, alt=false, line=0.2, solid=!$preview)
    makepoly(ldraw_lib__3004(solid), step=step, col=col, unit=unit, alt=alt, line=line, solid=solid);
ldraw_lib__3004(line=0.2);
// file: s/3005s01.scad
use <../../lib.scad>
use <../../p/box4t.scad>
use <../../p/box5.scad>
use <../../p/stud.scad>
$fa=1; $fs=0.2;
function ldraw_lib__s__3005s01(realsolid=false) = [
// 0 ~Brick  1 x  1 without Front Face
// 0 Name: s\3005s01.dat
// 0 Author: John Riley [jriley]
// 0 !LDRAW_ORG Subpart UPDATE 2004-01
// 0 !LICENSE Licensed under CC BY 2.0 and CC BY 4.0 : see CAreadme.txt
// 
// 0 BFC CERTIFY CCW
  [0,"BFC","CERTIFY"],
  [0,"BFC","CCW"],
// 
// 0 !HISTORY 2003-09-07 [jriley] BFCed & Subfiled
// 0 !HISTORY 2004-03-02 [PTadmin] Official Update 2004-01
// 0 !HISTORY 2007-08-29 [PTadmin] Header formatted for Contributor Agreement
// 0 !HISTORY 2008-07-01 [PTadmin] Official Update 2008-01
// 
// 
// 0 BFC INVERTNEXT
  [0,"BFC","INVERTNEXT"],
// 1 16 0 24 0 0 0 6 0 -20 0 -6 0 0 box5.dat
  [1,16,0,24,0,0,0,6,0,-20,0,-6,0,0, ldraw_lib__box5(realsolid)],
// 4 16 10 24 -10 6 24 -6 6 24 6 10 24 10
  [4,16,10,24,-10,6,24,-6,6,24,6,10,24,10],
// 4 16 10 24 10 6 24 6 -6 24 6 -10 24 10
  [4,16,10,24,10,6,24,6,-6,24,6,-10,24,10],
// 4 16 -10 24 10 -6 24 6 -6 24 -6 -10 24 -10
  [4,16,-10,24,10,-6,24,6,-6,24,-6,-10,24,-10],
// 4 16 -10 24 -10 -6 24 -6 6 24 -6 10 24 -10
  [4,16,-10,24,-10,-6,24,-6,6,24,-6,10,24,-10],
// 1 16 0 24 0 10 0 0 0 -24 0 0 0 10 box4t.dat
  [1,16,0,24,0,10,0,0,0,-24,0,0,0,10, ldraw_lib__box4t(realsolid)],
// 1 16 0 0 0 0 0 1 0 1 0 -1 0 0 stud.dat
  [1,16,0,0,0,0,0,1,0,1,0,-1,0,0, ldraw_lib__stud(realsolid)],
// 0
];
module ldraw_lib__s__3005s01(step=0, col=false, unit=2/5, alt=false, line=0.2, solid=!$preview)
    makepoly(ldraw_lib__s__3005s01(solid), step=step, col=col, unit=unit, alt=alt, line=line, solid=solid);
ldraw_lib__s__3005s01(line=0.2);
// main file
use <../lib.scad>
use <s/3005s01.scad>
$fa=1; $fs=0.2;
function ldraw_lib__3005pt1(realsolid=false) = [
// 0 Brick  1 x  1 with Blue "1" Pattern
// 0 Name: 3005pt1.dat
// 0 Author: Tore Eriksson [Tore_Eriksson]
// 0 !LDRAW_ORG Part UPDATE 2004-02
// 0 !LICENSE Licensed under CC BY 2.0 and CC BY 4.0 : see CAreadme.txt
// 
// 0 BFC CERTIFY CCW
  [0,"BFC","CERTIFY"],
  [0,"BFC","CCW"],
// 
// 0 !HISTORY 2003-06-08 [jriley] BFC compliant
// 0 !HISTORY 2004-04-22 [PTadmin] Official Update 2004-02
// 0 !HISTORY 2007-05-11 [PTadmin] Header formatted for Contributor Agreement
// 0 !HISTORY 2008-07-01 [PTadmin] Official Update 2008-01
// 
// 
// 1 16 0 0 0 1 0 0 0 1 0 0 0 1 s\3005s01.dat
  [1,16,0,0,0,1,0,0,0,1,0,0,0,1, ldraw_lib__s__3005s01(realsolid)],
// 4 1 -1 19 -10 1 19 -10 1 5 -10 -1 5.5 -10
  [4,1,-1,19,-10,1,19,-10,1,5,-10,-1,5.5,-10],
// 4 1 -1 5.5 -10 -3 6 -10 -3 8 -10 -1 7.5 -10
  [4,1,-1,5.5,-10,-3,6,-10,-3,8,-10,-1,7.5,-10],
// 3 1 -1 5 -10 -1 5.5 -10 1 5 -10
  [3,1,-1,5,-10,-1,5.5,-10,1,5,-10],
// 4 16 -10 0 -10 -3 6 -10 -1 5.5 -10 -1 5 -10
  [4,16,-10,0,-10,-3,6,-10,-1,5.5,-10,-1,5,-10],
// 4 16 -10 0 -10 -1 5 -10 1 5 -10 10 0 -10
  [4,16,-10,0,-10,-1,5,-10,1,5,-10,10,0,-10],
// 4 16 10 0 -10 1 5 -10 1 19 -10 10 24 -10
  [4,16,10,0,-10,1,5,-10,1,19,-10,10,24,-10],
// 4 16 10 24 -10 1 19 -10 -1 19 -10 -10 24 -10
  [4,16,10,24,-10,1,19,-10,-1,19,-10,-10,24,-10],
// 4 16 -10 24 -10 -1 19 -10 -1 7.5 -10 -3 8 -10
  [4,16,-10,24,-10,-1,19,-10,-1,7.5,-10,-3,8,-10],
// 4 16 -10 24 -10 -3 8 -10 -3 6 -10 -10 0 -10
  [4,16,-10,24,-10,-3,8,-10,-3,6,-10,-10,0,-10],
// 0
];
module ldraw_lib__3005pt1(step=0, col=false, unit=2/5, alt=false, line=0.2, solid=!$preview)
    makepoly(ldraw_lib__3005pt1(solid), step=step, col=col, unit=unit, alt=alt, line=line, solid=solid);
ldraw_lib__3005pt1(line=0.2);
